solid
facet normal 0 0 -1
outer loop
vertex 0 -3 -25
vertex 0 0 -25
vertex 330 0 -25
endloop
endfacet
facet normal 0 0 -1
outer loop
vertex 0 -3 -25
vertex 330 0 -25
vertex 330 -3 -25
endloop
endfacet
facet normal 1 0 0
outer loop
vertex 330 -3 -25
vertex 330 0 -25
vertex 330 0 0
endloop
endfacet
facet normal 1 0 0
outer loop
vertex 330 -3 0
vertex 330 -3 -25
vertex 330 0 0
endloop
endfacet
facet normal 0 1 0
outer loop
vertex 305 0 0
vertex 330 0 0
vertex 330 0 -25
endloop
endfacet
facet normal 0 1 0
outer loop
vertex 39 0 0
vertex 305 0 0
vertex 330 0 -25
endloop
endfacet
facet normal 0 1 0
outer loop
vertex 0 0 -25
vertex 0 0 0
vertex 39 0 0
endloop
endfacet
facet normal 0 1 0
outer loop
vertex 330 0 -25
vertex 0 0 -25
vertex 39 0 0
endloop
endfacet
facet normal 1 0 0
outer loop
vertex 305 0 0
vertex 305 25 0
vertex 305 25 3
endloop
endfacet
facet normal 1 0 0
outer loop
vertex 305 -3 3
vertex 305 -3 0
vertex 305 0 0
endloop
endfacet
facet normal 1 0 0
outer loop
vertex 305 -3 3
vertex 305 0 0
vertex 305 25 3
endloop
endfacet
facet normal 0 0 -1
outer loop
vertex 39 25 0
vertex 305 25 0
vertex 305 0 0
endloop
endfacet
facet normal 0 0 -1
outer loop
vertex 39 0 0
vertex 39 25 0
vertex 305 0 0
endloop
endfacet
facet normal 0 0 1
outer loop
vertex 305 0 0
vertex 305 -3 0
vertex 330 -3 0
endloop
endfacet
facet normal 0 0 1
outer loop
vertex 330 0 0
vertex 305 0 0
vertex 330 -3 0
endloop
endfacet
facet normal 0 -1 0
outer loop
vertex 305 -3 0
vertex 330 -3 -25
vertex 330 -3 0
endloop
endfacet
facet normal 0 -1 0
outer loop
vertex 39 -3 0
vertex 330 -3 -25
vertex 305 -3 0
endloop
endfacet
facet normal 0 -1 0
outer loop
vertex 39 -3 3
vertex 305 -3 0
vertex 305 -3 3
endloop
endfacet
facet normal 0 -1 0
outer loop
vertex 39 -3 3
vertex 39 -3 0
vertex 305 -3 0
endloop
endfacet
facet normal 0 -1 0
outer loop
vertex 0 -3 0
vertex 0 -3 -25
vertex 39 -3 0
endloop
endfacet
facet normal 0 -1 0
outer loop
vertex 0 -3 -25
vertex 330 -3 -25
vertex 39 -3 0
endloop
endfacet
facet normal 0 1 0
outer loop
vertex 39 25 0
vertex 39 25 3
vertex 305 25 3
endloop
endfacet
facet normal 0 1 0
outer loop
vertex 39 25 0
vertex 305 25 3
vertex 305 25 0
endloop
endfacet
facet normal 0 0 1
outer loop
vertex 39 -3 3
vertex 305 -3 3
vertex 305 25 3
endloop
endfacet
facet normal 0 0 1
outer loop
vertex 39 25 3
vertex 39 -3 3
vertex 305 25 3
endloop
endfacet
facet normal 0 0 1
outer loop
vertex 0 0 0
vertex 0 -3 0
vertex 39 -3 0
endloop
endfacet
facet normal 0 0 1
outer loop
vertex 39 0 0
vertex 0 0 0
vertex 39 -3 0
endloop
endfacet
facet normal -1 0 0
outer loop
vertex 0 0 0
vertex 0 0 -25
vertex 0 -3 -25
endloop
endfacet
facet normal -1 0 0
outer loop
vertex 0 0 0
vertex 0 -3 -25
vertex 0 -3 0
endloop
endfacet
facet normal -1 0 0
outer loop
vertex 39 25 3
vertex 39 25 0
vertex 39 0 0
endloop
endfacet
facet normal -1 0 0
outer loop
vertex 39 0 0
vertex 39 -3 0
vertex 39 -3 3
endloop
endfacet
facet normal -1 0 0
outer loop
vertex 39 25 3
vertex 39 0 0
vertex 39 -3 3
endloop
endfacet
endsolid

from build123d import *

# Parameters (mm, degrees)
EXTRUDE_1_DEPTH     = 330
SKETCH_2_W          = 39
SKETCH_2_H          = 3
SKETCH_2_W_2        = 25
CUT_EXTRUDE_1_DEPTH = 29


with BuildPart() as part:
    # Эскиз1 → Вытянуть-Тонкостенный1 (new body)
    with BuildSketch(Plane(origin=(0, 0, 0), x_dir=(0, 0, -1), z_dir=(1, 0, 0))):
        Polygon((0, 25), (0, 0), (25, 0), (25, -3), (-3, -3), (-3, 25), align=None)
    extrude(amount=EXTRUDE_1_DEPTH)

    # Эскиз2 → Вырез-Вытянуть1 (cut, through all)
    with BuildSketch(Plane.XZ.offset(3)):
        with Locations((19.5, 1.5)):
            Rectangle(SKETCH_2_W, SKETCH_2_H)
        with Locations((317.5, 1.5)):
            Rectangle(SKETCH_2_W_2, SKETCH_2_H)
    extrude(amount=-CUT_EXTRUDE_1_DEPTH, mode=Mode.SUBTRACT)


solid = part.part
